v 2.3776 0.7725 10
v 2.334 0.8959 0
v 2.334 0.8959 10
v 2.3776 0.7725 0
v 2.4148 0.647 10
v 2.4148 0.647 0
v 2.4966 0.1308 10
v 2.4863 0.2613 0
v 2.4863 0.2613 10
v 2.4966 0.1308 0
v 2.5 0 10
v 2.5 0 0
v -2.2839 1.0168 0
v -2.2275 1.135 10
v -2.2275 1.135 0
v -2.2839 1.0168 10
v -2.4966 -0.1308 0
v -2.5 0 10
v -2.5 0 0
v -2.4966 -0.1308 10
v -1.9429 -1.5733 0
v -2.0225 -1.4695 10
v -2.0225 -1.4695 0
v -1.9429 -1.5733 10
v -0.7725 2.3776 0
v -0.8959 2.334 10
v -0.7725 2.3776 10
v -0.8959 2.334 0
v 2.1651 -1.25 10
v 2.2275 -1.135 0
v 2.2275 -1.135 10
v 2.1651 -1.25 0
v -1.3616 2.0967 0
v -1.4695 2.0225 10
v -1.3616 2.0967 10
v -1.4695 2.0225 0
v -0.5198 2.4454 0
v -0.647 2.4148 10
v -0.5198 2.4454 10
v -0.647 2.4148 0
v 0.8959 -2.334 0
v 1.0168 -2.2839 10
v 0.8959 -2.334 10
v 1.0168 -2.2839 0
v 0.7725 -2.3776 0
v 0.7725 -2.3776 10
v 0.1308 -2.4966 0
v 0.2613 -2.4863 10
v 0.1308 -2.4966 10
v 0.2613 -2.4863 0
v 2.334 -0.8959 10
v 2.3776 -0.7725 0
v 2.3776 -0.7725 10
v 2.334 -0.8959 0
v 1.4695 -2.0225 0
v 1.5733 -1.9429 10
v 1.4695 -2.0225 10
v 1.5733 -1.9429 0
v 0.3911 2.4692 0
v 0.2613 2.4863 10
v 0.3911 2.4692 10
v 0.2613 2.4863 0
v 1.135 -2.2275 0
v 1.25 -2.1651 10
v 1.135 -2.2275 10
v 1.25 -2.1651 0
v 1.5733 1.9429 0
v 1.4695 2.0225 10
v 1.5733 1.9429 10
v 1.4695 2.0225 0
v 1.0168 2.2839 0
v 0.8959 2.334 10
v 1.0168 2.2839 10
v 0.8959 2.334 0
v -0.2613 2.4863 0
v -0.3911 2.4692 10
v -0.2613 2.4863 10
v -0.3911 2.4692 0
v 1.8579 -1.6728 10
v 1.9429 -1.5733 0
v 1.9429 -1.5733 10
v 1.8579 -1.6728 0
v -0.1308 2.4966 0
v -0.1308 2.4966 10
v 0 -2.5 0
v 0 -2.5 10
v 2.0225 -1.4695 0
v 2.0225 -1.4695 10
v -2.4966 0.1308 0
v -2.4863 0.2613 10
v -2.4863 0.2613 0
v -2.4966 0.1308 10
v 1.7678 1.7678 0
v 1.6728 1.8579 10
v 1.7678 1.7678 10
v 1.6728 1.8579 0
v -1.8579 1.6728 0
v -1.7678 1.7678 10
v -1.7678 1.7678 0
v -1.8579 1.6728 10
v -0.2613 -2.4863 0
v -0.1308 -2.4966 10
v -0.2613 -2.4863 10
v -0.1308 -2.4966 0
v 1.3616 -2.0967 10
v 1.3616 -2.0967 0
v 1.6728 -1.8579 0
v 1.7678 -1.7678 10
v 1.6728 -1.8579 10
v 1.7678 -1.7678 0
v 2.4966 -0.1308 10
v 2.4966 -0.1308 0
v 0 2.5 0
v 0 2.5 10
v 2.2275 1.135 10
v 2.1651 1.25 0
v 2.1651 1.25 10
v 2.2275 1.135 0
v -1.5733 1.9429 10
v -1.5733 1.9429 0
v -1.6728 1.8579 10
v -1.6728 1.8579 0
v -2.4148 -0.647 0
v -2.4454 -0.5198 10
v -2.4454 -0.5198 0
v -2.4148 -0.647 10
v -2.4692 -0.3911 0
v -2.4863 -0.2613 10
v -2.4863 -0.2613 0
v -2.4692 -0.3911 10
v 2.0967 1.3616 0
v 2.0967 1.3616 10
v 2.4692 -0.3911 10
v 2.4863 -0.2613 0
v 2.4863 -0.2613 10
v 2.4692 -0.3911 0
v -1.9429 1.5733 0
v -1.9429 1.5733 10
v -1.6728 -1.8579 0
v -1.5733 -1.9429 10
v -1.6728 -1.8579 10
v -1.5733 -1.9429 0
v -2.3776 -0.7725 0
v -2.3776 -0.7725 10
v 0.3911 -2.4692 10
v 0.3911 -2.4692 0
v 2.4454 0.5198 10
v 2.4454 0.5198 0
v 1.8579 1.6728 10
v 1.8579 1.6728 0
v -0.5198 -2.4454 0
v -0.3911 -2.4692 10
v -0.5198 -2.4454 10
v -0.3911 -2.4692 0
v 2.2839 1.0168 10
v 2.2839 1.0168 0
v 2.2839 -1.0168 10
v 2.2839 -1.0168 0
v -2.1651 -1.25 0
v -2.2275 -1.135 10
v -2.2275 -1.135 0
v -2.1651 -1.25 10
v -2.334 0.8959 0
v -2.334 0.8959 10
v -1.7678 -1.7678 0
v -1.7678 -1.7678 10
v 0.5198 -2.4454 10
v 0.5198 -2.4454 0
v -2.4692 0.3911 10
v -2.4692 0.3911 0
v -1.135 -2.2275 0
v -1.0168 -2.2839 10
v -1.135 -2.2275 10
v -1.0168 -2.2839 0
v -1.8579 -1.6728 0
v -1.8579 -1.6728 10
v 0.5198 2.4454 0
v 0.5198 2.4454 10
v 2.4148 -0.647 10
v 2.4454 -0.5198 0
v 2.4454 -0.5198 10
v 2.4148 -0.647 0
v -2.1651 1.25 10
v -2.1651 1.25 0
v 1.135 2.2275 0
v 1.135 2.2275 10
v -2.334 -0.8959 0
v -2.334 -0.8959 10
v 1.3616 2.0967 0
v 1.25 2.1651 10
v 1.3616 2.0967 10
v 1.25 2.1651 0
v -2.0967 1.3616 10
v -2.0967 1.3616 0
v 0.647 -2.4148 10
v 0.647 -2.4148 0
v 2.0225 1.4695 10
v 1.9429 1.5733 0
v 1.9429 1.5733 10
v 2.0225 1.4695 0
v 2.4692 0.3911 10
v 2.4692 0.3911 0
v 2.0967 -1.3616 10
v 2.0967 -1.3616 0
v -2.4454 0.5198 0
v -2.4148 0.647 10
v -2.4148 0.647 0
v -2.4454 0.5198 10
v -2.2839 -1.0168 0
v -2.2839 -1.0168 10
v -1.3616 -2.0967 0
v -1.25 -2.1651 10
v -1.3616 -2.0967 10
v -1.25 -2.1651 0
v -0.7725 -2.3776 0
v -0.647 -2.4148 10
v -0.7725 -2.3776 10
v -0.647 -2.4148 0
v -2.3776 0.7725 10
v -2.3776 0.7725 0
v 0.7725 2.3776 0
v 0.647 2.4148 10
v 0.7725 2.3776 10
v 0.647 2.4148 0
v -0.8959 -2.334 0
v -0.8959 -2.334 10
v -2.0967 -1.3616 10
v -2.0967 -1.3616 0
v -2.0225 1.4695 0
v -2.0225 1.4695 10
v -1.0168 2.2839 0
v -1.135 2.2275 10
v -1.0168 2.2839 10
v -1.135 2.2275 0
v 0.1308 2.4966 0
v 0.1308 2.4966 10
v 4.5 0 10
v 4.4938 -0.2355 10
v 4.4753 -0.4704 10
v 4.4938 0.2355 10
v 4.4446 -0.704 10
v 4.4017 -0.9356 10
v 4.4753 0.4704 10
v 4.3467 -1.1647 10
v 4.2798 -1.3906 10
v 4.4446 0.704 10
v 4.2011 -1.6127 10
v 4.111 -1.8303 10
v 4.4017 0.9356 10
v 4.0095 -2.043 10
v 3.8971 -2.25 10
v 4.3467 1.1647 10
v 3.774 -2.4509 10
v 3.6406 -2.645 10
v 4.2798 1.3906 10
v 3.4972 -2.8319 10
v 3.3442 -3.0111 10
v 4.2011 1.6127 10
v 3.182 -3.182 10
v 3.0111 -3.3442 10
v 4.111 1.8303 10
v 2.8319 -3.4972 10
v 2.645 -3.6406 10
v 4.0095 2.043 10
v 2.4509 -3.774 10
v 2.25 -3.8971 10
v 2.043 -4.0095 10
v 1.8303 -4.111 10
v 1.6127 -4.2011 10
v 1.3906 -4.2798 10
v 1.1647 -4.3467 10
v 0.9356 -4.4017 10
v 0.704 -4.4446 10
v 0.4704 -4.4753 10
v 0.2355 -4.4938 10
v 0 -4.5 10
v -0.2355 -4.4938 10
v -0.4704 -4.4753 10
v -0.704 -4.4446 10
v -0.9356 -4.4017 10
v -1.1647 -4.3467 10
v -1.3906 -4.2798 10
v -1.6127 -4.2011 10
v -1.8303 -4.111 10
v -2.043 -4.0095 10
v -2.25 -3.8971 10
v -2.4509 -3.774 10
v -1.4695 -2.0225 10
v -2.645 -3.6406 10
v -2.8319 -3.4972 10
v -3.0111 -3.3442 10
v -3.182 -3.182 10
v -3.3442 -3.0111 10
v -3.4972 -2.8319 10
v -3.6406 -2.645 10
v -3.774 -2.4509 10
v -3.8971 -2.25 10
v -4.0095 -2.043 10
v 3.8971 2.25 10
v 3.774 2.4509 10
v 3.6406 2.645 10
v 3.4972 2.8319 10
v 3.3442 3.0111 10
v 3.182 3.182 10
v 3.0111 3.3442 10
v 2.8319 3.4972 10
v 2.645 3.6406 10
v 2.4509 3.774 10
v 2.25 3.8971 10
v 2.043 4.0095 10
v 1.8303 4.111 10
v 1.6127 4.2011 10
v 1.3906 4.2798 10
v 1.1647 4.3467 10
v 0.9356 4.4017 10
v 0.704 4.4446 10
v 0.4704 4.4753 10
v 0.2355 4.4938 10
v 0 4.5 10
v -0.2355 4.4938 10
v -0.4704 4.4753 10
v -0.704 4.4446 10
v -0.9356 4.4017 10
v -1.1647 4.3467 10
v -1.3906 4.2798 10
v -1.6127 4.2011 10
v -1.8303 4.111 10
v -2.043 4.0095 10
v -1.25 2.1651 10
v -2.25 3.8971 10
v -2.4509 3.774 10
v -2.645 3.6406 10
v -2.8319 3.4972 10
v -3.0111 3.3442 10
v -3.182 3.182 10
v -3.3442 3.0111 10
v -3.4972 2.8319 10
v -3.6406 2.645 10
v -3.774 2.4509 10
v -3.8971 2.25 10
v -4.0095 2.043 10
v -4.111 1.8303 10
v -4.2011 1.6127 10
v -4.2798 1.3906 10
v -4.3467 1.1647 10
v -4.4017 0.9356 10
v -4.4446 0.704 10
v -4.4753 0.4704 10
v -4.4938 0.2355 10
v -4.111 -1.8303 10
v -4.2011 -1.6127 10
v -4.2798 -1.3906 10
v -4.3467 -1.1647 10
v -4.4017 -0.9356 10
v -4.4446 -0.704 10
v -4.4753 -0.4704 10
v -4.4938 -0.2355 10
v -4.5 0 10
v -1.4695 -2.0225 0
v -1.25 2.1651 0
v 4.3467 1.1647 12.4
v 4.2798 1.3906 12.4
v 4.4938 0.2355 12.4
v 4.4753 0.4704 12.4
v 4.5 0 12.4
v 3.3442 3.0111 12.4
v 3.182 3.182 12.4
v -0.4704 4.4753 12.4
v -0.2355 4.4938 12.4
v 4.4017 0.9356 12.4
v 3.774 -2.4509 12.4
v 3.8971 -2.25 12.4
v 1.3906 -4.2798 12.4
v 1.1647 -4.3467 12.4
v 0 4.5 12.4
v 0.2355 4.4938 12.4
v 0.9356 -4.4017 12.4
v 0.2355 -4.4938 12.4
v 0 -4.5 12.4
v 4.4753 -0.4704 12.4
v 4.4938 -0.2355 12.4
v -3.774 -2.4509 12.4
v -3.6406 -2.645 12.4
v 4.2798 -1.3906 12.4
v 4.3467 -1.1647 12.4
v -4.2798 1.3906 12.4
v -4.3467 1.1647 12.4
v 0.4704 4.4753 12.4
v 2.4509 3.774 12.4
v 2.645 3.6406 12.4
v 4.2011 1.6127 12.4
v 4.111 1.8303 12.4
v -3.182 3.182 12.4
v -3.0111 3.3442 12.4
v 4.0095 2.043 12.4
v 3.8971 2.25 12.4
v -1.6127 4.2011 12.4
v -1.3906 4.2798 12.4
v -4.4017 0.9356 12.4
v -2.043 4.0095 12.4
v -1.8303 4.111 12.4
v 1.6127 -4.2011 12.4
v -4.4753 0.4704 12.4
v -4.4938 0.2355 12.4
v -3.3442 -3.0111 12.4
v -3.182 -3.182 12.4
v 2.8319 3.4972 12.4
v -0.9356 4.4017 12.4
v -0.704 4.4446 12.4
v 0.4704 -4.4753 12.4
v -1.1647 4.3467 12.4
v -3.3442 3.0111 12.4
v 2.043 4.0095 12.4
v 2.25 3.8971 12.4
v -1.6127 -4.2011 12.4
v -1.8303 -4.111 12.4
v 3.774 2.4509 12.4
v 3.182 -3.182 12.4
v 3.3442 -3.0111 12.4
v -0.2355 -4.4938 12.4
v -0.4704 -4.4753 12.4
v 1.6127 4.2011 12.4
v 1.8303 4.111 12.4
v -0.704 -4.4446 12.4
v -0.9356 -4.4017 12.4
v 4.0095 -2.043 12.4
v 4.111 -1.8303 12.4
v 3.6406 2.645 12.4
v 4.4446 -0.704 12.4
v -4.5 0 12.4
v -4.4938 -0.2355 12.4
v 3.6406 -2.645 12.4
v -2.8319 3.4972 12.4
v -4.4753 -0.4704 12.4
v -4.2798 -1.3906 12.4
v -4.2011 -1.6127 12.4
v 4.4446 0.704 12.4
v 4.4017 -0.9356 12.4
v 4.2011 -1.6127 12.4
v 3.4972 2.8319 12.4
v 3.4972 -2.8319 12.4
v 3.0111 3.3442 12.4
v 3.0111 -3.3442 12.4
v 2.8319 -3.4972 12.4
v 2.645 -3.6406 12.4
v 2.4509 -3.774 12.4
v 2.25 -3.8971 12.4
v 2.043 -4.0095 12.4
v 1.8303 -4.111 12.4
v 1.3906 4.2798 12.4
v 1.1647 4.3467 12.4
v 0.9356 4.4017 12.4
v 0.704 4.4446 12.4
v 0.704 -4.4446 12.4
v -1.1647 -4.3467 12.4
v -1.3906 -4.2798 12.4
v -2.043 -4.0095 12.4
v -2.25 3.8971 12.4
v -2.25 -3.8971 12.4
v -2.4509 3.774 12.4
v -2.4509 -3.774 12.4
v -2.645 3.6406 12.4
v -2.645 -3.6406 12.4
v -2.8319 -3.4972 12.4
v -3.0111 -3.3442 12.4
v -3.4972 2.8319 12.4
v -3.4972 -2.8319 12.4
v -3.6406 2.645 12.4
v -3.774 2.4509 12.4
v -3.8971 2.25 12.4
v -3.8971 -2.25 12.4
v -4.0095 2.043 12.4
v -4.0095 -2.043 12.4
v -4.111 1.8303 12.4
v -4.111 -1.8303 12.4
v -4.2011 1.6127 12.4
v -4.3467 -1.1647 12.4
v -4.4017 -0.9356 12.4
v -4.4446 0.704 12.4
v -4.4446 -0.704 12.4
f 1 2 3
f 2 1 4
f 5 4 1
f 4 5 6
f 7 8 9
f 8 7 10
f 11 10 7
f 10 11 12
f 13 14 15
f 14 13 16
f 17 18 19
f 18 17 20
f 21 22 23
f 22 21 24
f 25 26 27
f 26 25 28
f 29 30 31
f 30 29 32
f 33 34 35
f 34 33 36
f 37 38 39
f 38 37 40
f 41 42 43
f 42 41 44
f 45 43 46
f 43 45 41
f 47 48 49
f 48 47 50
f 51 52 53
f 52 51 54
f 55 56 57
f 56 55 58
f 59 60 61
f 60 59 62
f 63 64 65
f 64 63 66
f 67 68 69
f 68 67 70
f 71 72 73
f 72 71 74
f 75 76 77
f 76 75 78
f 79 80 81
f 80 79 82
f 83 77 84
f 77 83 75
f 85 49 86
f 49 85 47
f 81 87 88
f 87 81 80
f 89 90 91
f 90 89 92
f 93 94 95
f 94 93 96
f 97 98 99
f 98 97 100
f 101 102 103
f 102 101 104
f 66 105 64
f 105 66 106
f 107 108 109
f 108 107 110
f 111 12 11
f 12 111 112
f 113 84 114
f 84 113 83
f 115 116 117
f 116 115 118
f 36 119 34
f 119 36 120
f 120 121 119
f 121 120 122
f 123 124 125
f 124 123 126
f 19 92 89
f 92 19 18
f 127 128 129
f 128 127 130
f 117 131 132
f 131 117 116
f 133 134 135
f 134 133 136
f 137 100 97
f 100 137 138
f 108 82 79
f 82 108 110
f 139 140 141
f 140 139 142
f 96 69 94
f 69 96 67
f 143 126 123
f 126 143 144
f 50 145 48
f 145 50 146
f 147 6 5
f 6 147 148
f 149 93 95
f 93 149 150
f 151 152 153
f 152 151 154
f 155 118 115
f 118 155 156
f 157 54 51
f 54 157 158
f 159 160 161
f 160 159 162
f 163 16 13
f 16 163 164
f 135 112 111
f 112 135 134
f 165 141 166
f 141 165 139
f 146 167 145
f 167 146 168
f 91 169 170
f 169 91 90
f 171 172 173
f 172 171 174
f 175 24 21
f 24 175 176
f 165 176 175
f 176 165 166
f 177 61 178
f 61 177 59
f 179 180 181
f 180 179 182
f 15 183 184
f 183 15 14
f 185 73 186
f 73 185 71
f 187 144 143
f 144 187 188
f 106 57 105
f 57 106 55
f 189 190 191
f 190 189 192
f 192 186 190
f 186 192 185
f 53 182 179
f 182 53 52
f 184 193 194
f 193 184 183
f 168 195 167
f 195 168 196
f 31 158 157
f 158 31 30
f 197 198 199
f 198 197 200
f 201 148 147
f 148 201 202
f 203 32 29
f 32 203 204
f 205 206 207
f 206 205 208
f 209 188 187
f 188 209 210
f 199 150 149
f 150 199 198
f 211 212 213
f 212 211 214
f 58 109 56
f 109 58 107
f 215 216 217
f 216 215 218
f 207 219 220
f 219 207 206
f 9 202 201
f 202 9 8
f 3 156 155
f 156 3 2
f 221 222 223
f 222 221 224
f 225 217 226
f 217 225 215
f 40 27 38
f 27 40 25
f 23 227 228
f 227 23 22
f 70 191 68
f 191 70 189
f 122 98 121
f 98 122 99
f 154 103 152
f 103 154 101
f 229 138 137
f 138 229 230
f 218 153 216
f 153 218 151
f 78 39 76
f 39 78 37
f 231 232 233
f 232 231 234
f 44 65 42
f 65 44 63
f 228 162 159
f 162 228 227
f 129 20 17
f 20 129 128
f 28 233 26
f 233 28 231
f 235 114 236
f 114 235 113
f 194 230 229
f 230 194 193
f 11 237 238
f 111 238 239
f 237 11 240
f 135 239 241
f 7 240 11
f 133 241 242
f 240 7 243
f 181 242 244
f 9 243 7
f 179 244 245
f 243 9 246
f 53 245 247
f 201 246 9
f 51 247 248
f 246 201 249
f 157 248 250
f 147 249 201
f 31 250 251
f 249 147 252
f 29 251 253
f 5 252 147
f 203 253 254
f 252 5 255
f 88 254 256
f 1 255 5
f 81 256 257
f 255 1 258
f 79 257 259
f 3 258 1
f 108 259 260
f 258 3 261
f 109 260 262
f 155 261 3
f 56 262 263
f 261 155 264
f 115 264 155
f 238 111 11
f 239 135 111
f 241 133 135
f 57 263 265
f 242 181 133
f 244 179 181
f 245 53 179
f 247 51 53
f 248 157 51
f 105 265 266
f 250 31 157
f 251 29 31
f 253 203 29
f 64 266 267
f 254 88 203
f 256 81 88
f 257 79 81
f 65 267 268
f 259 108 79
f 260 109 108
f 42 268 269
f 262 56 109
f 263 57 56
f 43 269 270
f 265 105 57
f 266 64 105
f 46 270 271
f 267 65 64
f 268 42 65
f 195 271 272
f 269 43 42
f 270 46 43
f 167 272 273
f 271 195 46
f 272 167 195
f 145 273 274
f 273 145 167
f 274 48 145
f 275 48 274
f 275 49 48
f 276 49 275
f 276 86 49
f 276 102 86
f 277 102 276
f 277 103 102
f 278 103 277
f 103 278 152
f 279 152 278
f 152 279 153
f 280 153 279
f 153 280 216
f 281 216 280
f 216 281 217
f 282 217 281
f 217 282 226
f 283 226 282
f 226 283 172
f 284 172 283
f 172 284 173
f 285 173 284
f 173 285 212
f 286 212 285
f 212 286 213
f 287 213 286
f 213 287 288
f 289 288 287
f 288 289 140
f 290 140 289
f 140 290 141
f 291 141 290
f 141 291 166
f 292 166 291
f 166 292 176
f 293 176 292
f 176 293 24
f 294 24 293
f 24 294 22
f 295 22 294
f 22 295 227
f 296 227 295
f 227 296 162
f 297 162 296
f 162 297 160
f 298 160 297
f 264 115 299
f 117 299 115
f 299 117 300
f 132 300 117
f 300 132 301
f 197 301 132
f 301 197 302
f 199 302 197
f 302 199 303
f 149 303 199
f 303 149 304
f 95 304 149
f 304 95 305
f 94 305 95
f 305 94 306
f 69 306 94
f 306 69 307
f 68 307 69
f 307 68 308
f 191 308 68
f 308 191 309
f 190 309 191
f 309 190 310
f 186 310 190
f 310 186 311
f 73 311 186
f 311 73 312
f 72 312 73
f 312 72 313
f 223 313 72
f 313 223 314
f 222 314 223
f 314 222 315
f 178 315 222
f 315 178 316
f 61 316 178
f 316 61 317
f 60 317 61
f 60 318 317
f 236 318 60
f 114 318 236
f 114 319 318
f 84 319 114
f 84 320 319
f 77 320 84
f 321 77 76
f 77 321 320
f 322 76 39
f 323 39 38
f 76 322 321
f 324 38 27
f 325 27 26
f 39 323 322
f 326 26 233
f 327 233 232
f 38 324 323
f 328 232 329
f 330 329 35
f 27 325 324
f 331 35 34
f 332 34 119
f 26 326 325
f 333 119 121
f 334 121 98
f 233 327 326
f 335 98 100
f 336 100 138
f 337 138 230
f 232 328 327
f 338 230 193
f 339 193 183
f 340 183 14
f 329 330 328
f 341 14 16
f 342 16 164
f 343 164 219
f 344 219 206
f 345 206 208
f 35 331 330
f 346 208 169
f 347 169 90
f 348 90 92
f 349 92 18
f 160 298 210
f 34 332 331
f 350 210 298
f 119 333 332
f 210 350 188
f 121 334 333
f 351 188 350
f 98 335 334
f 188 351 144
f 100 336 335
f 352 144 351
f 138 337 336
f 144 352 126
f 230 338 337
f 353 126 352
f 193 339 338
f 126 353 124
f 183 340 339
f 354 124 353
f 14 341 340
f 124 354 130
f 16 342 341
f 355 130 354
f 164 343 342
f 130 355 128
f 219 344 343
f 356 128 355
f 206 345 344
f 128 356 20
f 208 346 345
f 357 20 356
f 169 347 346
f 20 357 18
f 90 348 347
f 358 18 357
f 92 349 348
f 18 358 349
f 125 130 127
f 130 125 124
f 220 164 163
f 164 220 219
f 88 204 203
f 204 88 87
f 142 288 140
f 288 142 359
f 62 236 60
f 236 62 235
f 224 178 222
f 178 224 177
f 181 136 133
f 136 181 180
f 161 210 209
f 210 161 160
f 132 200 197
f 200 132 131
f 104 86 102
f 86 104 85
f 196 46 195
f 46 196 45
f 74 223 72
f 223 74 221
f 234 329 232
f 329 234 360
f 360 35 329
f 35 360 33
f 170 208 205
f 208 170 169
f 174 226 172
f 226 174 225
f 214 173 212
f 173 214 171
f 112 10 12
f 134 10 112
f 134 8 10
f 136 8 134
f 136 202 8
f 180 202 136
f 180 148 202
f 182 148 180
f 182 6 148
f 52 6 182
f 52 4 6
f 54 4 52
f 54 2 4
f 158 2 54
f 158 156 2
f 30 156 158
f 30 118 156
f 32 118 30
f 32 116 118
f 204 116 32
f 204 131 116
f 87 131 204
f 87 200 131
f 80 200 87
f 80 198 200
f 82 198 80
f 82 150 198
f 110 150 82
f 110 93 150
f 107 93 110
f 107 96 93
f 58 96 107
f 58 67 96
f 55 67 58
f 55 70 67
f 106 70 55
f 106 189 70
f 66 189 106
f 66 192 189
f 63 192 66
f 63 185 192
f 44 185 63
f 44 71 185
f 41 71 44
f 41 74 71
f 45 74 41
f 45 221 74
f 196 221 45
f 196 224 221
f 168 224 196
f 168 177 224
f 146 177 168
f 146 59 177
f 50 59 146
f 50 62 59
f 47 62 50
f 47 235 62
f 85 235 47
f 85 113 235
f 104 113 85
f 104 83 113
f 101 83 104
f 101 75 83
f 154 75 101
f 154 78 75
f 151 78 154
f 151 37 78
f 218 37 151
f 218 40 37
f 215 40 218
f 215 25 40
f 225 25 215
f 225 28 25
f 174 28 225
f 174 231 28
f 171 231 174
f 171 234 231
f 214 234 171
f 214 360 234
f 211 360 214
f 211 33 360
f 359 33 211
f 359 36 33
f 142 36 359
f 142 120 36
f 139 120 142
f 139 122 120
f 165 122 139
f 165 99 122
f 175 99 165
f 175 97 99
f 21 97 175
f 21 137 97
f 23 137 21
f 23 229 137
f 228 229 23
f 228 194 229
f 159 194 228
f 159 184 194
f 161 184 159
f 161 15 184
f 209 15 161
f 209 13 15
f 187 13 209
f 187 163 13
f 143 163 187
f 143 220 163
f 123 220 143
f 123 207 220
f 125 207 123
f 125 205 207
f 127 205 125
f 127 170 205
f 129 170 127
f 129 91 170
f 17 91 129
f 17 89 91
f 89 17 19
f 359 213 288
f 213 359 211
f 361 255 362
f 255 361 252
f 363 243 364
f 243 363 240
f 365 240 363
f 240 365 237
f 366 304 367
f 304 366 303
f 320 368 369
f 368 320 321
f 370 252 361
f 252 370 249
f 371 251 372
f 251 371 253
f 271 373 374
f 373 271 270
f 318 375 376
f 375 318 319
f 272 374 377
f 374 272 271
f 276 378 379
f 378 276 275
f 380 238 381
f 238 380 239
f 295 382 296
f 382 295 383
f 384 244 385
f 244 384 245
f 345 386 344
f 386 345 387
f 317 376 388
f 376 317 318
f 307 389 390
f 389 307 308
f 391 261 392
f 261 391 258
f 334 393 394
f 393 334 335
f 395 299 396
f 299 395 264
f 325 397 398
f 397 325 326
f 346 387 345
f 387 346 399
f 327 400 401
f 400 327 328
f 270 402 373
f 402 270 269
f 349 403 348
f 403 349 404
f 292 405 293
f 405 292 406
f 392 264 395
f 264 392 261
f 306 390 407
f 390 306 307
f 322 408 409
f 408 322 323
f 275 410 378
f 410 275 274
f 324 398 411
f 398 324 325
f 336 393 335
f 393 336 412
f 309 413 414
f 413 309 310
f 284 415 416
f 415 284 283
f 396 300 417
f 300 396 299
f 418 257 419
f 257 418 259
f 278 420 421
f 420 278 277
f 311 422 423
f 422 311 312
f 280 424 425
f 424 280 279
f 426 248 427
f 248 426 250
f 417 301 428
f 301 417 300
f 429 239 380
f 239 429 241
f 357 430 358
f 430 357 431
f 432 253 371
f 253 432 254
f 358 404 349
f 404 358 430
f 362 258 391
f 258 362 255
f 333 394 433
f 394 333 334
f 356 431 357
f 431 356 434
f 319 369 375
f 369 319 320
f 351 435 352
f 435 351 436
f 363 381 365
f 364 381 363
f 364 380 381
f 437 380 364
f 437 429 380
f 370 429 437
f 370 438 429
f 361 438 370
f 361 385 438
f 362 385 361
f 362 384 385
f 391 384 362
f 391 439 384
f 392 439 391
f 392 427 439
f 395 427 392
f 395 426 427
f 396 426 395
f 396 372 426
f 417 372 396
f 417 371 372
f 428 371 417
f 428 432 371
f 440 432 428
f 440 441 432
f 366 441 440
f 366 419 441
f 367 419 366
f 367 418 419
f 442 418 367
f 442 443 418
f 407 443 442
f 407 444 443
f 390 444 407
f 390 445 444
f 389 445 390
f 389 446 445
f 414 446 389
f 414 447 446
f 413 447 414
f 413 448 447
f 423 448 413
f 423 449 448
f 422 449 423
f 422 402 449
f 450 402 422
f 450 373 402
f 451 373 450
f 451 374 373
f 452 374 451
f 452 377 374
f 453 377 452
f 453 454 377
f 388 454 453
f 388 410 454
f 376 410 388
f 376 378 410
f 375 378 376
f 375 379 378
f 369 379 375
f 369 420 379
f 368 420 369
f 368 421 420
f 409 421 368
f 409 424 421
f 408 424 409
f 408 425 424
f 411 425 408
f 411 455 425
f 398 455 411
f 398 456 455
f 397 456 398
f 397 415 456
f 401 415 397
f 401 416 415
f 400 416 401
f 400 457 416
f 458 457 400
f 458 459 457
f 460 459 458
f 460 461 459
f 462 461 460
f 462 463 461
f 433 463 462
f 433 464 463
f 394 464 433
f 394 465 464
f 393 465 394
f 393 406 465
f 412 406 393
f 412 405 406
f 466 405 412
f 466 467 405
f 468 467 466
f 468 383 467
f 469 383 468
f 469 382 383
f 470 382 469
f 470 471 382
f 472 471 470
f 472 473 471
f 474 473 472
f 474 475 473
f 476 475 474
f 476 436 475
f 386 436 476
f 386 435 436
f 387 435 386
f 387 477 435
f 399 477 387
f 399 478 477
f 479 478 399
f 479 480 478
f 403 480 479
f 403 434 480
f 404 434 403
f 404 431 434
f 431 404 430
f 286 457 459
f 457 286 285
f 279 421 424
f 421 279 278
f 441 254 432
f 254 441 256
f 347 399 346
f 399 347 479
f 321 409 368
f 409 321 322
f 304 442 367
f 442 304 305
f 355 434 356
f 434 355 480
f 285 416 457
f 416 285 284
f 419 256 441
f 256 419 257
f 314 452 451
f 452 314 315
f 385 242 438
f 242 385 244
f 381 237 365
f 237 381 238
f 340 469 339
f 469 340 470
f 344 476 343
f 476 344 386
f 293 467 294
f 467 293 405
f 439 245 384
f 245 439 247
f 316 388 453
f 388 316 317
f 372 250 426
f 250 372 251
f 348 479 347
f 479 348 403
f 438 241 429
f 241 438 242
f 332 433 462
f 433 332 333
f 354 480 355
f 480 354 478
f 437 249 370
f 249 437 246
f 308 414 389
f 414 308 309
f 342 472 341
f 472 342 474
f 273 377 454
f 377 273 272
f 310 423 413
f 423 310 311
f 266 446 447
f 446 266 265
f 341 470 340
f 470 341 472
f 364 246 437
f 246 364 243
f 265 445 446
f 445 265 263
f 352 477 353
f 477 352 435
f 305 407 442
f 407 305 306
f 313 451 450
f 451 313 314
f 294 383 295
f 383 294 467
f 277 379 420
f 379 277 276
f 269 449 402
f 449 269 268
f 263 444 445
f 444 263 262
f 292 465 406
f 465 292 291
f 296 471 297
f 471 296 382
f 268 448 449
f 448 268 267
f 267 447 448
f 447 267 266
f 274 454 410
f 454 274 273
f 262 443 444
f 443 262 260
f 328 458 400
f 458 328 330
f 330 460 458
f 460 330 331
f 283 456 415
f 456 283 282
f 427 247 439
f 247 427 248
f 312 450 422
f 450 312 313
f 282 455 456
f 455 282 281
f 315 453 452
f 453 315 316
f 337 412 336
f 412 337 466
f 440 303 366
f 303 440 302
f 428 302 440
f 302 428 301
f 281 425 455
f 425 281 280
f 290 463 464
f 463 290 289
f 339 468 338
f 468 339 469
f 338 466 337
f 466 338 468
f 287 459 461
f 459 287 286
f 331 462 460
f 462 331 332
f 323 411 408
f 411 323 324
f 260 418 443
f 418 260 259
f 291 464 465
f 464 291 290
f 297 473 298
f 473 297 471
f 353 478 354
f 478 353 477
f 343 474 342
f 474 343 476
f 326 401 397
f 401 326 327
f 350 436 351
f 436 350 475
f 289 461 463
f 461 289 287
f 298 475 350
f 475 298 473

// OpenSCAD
$fn=120;

shaft_d = 5.0;
head_d  = 9.0;
head_h  = 2.4;
len     = 10.0;

union() {
  cylinder(d=shaft_d, h=len, center=false);
  translate([0,0,len])
    cylinder(d=head_d, h=head_h, center=false);
}
